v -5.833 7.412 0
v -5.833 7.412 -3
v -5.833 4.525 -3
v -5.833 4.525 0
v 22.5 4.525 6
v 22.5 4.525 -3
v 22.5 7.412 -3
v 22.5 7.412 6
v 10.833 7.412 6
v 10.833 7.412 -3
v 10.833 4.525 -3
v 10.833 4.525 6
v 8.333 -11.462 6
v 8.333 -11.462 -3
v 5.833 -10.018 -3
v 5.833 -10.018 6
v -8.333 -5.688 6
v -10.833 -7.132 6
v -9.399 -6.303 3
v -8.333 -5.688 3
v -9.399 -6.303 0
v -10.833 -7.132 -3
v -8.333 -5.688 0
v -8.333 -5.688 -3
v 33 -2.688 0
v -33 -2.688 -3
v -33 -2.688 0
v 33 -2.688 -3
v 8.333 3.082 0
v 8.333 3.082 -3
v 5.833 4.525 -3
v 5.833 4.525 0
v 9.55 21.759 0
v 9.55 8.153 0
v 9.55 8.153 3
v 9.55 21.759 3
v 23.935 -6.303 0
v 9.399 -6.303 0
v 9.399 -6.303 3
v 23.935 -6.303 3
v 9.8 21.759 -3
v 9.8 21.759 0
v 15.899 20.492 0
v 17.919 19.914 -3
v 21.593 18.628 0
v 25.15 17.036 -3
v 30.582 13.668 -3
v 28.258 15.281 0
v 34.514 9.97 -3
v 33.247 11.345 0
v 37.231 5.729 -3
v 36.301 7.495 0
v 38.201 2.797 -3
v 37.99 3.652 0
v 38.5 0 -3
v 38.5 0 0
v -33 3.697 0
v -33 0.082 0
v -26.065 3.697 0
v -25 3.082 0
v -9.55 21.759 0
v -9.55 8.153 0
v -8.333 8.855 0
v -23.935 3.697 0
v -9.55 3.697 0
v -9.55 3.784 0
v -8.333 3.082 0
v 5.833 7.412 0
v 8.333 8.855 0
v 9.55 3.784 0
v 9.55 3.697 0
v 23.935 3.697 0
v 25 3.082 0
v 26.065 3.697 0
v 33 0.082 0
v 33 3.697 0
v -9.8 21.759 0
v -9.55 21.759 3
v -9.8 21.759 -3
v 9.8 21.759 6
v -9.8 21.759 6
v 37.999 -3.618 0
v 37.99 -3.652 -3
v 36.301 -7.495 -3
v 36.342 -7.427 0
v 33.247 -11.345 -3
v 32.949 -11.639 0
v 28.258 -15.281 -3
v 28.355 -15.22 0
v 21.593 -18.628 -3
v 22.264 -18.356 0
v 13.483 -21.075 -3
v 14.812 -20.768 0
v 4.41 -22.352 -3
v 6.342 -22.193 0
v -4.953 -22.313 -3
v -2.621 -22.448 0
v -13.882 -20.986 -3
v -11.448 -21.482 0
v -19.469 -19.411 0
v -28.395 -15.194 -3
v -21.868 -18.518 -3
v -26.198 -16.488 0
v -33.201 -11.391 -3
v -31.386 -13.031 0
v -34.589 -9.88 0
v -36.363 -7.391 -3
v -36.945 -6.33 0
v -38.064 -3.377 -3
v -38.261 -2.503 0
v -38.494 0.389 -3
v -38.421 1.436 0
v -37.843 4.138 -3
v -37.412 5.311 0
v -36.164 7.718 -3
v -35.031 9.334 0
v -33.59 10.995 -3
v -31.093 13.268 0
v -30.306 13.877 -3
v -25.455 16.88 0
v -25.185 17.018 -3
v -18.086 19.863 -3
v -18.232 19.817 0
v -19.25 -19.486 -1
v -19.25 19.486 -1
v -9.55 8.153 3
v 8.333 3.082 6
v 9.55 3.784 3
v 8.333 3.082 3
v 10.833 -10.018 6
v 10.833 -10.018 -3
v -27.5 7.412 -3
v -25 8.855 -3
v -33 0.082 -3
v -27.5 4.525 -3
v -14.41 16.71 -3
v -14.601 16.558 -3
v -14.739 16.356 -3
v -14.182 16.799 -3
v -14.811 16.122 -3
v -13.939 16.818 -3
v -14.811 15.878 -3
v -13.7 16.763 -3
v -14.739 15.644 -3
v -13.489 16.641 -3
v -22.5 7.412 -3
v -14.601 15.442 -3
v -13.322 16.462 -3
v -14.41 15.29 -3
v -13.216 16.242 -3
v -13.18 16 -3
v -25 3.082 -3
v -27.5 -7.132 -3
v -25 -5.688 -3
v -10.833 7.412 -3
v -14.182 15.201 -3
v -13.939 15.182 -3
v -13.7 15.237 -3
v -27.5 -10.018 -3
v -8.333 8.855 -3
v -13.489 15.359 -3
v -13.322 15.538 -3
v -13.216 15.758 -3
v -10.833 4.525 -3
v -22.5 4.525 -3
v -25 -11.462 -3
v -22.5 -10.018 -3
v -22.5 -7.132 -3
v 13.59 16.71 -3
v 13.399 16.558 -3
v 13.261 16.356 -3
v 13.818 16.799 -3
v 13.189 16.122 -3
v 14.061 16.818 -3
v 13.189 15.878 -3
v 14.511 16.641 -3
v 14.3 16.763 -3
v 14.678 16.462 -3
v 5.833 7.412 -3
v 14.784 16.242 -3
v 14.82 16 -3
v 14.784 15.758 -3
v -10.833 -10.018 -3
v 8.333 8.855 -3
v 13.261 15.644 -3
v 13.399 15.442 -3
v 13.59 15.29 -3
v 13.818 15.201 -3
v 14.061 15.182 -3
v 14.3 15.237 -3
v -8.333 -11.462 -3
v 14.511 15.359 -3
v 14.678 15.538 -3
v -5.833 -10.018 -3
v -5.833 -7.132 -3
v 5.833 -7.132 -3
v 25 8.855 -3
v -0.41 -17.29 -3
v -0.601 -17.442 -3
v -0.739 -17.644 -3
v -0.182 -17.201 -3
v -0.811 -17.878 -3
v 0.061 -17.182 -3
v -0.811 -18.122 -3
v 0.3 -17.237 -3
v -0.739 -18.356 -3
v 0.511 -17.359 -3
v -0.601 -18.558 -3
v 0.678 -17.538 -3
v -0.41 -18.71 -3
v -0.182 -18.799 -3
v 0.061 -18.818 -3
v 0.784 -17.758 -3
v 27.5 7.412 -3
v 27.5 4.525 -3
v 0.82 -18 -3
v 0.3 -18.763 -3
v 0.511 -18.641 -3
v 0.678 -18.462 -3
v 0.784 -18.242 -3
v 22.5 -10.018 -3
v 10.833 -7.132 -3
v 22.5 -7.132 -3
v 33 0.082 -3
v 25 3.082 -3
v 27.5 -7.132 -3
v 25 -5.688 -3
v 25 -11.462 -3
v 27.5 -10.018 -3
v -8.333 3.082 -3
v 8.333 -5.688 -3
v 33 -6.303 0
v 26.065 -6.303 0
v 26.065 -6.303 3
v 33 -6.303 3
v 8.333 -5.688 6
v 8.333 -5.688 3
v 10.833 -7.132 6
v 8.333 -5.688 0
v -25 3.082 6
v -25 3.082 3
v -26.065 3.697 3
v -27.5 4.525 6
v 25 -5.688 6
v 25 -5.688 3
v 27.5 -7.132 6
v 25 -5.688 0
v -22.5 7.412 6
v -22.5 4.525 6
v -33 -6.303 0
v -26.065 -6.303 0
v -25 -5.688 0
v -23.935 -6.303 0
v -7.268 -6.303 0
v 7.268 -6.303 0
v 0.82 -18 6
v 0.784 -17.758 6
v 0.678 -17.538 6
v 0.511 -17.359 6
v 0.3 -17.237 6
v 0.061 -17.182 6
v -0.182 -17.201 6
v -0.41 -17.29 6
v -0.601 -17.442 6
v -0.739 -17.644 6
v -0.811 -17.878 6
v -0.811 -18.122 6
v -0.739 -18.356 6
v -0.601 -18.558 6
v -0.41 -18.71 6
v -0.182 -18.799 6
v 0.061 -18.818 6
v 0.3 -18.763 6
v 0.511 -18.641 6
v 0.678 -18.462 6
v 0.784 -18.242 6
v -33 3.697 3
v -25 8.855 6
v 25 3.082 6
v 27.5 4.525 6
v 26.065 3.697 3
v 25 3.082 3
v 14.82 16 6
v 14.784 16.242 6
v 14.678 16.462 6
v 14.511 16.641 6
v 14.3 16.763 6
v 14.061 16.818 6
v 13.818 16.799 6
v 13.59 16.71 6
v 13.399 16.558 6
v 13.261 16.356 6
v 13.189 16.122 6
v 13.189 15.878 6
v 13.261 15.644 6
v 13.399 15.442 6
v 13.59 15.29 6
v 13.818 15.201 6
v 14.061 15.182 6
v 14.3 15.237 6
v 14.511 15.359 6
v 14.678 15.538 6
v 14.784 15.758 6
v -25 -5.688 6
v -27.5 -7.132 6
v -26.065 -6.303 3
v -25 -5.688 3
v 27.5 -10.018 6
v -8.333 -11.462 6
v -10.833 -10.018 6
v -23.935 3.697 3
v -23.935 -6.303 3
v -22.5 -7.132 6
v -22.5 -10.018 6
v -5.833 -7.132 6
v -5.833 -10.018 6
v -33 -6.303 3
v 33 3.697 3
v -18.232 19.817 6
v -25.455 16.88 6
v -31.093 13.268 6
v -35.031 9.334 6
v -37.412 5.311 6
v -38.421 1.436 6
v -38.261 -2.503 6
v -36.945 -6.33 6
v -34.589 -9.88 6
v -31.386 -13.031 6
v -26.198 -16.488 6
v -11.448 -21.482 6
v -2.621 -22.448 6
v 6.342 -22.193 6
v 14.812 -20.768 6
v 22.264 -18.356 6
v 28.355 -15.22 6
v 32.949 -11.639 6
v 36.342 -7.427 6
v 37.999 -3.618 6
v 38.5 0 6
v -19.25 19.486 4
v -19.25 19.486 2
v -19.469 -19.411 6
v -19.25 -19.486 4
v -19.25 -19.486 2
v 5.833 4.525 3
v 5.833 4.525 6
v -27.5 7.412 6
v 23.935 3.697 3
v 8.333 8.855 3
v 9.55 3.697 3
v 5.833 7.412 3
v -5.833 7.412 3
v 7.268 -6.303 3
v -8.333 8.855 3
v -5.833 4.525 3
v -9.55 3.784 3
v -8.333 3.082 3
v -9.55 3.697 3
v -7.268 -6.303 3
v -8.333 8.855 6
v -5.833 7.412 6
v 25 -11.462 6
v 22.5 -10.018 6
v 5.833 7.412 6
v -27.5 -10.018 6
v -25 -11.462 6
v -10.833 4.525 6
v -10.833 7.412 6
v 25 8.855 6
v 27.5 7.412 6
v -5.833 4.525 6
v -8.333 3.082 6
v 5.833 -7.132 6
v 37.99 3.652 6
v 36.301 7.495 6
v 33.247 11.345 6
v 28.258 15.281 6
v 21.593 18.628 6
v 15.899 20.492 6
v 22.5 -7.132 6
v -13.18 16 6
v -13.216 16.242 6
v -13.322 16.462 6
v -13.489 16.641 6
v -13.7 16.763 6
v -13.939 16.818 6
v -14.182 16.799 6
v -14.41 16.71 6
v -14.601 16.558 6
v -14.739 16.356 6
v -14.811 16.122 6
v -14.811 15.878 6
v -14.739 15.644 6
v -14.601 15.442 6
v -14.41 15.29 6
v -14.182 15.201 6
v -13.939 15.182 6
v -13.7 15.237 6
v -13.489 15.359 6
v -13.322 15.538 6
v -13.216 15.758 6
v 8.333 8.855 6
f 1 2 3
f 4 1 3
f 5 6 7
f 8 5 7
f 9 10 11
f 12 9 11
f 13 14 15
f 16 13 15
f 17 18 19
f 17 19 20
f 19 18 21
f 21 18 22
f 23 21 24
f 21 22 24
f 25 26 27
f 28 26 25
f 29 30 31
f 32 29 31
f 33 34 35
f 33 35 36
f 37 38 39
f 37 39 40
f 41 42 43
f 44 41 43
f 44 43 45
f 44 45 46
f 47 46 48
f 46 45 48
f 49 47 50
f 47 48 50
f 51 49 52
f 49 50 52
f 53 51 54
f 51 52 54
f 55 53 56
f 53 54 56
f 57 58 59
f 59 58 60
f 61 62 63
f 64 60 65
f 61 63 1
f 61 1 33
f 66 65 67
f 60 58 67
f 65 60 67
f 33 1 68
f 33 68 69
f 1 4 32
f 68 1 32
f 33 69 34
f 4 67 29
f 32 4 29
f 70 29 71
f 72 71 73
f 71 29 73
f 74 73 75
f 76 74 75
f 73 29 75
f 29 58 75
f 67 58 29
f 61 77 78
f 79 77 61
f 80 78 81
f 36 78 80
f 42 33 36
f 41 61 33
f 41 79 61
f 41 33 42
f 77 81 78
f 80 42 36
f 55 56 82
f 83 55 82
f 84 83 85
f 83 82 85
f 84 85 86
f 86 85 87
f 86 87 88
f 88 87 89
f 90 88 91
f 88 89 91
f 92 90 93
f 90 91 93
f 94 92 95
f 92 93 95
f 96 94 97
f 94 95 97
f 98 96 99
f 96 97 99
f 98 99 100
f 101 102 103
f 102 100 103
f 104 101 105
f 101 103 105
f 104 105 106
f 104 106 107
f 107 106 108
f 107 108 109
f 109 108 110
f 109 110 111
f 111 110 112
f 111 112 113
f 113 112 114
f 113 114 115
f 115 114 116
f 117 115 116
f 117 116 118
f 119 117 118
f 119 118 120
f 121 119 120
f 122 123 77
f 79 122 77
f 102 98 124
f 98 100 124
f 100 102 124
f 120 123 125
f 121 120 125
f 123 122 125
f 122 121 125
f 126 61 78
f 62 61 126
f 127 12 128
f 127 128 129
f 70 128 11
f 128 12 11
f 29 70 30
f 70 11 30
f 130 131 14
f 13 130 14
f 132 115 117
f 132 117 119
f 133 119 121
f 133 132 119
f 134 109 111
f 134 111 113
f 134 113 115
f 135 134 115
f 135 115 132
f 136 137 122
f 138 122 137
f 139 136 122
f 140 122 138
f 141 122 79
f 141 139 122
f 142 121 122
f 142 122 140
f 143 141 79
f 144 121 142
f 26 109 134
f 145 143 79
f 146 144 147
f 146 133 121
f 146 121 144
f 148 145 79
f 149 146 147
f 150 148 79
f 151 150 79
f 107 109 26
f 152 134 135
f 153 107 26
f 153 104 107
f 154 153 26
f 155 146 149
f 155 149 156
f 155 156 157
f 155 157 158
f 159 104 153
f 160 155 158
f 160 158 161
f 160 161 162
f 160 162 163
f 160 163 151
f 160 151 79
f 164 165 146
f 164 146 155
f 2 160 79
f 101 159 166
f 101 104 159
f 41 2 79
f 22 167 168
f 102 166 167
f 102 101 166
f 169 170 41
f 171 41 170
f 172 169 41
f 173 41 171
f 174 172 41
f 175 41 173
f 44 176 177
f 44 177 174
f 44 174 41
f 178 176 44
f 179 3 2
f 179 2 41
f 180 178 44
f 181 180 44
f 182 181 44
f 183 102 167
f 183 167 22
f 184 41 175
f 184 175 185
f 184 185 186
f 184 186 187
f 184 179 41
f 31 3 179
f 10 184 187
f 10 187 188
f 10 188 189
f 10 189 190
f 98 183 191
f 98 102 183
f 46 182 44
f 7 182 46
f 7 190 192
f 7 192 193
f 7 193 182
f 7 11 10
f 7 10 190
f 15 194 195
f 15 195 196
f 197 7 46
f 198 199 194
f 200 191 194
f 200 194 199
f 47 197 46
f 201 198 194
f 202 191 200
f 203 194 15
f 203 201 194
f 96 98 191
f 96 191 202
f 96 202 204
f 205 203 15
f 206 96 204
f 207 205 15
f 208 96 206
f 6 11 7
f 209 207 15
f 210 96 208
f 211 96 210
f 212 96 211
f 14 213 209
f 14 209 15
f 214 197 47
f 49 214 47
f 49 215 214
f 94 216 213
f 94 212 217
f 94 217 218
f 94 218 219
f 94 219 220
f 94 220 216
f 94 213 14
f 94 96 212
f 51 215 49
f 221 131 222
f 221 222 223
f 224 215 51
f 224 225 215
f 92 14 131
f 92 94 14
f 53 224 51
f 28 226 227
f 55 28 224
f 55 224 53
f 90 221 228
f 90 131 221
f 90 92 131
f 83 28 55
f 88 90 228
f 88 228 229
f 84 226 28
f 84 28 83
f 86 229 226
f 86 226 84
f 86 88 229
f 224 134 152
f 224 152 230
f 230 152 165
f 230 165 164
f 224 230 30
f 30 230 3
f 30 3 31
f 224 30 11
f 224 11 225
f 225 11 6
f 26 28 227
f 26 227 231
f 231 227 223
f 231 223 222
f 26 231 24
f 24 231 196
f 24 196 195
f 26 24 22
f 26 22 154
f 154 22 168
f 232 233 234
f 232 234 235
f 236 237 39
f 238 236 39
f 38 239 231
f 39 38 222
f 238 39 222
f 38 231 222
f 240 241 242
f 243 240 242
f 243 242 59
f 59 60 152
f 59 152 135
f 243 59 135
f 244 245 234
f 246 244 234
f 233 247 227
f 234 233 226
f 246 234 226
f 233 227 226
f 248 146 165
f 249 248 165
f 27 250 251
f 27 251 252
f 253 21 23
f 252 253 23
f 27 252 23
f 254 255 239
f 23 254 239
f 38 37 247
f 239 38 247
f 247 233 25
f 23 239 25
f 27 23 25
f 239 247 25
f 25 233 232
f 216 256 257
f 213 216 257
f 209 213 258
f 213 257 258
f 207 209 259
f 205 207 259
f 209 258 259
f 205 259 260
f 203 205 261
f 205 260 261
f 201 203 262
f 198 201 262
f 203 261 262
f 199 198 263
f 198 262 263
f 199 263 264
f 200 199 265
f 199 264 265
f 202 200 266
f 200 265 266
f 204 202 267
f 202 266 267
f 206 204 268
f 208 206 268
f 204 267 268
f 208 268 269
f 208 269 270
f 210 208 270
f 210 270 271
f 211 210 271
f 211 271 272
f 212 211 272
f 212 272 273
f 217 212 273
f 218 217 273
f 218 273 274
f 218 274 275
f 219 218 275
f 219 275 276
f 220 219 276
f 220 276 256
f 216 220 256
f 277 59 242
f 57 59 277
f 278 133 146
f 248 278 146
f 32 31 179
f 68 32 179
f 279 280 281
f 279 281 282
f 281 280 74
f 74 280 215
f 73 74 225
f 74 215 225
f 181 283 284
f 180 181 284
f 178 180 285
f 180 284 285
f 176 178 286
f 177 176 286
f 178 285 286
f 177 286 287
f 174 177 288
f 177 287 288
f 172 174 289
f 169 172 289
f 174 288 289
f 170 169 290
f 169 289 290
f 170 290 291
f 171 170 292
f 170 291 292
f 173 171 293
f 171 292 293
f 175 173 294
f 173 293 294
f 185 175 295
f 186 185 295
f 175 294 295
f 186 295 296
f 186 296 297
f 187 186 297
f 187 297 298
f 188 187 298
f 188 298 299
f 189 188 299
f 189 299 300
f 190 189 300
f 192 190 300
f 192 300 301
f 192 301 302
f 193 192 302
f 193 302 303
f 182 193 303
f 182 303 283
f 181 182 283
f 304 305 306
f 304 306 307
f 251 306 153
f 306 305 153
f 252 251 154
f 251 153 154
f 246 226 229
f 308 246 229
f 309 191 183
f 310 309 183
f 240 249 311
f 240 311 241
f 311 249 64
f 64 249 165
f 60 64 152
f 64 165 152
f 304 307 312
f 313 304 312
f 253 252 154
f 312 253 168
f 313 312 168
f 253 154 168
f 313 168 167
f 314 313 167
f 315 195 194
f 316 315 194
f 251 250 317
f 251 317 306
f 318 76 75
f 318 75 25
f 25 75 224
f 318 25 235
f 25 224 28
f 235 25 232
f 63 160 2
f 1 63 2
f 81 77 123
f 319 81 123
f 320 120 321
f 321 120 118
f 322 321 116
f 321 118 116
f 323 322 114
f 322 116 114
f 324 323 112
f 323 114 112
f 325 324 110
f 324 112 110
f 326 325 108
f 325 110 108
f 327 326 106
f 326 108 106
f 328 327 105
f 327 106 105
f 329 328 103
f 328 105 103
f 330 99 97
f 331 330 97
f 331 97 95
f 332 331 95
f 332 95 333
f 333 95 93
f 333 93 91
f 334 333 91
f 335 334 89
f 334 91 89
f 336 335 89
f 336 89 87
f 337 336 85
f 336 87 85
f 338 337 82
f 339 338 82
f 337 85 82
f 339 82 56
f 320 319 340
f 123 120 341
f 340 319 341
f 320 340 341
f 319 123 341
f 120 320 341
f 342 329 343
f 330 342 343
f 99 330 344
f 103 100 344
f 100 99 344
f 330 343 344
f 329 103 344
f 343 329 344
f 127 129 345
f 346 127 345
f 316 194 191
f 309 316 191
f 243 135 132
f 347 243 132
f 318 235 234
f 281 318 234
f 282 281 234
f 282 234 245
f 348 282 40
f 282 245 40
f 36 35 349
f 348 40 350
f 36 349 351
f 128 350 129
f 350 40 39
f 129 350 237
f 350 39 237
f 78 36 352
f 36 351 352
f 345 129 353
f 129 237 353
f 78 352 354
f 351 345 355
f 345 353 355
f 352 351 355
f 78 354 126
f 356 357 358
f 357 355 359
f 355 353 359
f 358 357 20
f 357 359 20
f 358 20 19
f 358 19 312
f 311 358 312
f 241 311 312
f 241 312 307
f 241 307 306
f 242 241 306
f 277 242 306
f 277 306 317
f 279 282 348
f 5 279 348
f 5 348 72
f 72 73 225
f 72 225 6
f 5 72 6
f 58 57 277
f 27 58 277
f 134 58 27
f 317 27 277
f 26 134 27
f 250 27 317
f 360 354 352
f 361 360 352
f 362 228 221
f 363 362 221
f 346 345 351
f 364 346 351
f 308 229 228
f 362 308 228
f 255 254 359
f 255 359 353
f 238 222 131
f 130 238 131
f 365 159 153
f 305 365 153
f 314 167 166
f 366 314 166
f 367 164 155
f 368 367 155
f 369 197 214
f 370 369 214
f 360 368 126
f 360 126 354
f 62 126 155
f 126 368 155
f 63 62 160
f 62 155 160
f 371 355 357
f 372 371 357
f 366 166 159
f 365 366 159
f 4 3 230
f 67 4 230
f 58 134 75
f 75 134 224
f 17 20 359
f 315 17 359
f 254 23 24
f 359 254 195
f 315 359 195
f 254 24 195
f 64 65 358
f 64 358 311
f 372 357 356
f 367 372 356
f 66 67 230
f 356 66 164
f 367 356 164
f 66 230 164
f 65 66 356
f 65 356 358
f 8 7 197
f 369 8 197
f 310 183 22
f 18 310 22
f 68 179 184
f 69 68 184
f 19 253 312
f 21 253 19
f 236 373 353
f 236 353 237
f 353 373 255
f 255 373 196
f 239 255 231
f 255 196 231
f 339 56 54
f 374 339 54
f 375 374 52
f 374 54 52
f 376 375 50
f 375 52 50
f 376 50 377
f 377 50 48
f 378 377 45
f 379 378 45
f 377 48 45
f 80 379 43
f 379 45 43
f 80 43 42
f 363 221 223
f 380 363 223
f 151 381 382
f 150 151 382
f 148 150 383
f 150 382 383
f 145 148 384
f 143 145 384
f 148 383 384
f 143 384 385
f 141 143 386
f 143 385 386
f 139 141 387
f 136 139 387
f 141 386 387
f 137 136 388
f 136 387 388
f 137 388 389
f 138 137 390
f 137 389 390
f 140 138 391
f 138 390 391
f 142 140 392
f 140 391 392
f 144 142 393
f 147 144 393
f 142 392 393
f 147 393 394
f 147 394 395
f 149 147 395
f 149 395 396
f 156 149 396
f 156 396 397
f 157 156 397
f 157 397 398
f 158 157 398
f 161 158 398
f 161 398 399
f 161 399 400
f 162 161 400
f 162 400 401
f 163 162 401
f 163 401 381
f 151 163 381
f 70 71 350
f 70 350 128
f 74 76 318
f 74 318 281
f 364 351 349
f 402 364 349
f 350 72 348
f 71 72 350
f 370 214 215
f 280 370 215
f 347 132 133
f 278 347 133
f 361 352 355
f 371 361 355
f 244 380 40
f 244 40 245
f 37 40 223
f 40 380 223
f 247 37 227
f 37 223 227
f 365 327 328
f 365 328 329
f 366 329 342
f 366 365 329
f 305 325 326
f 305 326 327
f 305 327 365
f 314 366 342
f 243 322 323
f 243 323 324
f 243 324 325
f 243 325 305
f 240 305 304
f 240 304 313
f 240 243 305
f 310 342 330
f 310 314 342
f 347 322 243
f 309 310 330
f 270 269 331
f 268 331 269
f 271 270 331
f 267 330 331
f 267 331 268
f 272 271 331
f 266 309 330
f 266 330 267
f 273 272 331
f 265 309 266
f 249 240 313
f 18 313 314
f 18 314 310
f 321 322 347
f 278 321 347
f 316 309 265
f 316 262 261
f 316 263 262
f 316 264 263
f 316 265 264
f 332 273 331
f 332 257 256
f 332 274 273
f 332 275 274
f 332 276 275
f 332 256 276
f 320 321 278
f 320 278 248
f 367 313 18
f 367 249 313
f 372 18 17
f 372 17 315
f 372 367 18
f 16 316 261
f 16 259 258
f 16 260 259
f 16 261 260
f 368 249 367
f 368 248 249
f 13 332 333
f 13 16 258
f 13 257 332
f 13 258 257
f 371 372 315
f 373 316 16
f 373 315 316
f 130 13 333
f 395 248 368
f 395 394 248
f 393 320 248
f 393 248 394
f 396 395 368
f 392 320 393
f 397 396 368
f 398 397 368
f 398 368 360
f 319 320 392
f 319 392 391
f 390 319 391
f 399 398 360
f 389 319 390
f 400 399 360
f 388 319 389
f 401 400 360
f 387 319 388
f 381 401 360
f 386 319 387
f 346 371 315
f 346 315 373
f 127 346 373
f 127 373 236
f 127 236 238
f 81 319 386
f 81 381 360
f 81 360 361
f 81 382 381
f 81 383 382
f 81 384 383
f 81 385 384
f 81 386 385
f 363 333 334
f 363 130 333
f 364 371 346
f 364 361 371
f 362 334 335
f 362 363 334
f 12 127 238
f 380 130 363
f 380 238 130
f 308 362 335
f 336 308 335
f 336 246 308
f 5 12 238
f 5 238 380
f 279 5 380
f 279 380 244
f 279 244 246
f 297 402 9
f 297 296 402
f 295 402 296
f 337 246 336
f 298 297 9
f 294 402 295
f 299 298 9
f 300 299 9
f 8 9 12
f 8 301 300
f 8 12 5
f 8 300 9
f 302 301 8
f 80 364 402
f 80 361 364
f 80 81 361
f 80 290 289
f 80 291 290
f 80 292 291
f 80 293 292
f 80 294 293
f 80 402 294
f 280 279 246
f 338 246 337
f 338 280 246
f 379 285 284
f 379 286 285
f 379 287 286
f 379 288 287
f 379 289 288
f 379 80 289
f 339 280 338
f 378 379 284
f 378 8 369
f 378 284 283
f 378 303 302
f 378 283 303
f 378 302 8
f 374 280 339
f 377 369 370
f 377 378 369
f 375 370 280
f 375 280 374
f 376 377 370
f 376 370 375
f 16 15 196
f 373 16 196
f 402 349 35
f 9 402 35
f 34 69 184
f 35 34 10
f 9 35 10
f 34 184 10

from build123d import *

# Parameters (mm, degrees)
PAD_DEPTH           = 6
POCKET_DEPTH        = 3
PAD001_DEPTH        = 3
SKETCH003_W         = 66
SKETCH003_H         = 2.77
POCKET001_DEPTH     = 3
SKETCH004_W         = 19.6
SKETCH004_H         = 1
POCKET002_DEPTH     = 9.001
SKETCH005_R         = 0.82
POCKET003_DEPTH     = 9.001
POCKET004_DEPTH     = 9.001
LINEARPATTERN_COUNT = 4
LINEARPATTERN_PITCH = 16.666667


with BuildPart() as part:
    # Sketch → Pad (new body)
    with BuildSketch(Plane.XY):
        with BuildLine():
            add(Edge.make_bspline(
                [(38.5, 0), (38.5, 38.971143), (-19.25, 19.485572), (-77, 0), (-19.25, -19.485572), (38.5, -38.971143), (38.5, 0)],
                knots=[0, 0, 0, 2.094395, 2.094395, 4.18879, 4.18879, 6.283185, 6.283185, 6.283185], degree=2, weights=[1, 0.5, 1, 0.5, 1, 0.5, 1]))
        make_face()
    extrude(amount=PAD_DEPTH)

    # Sketch001 (on Face2 of Pad) → Pocket (cut)
    with BuildSketch(Plane(origin=(0, 0, 0), x_dir=(1, 0, 0), z_dir=(0, 0, -1))):
        Polygon((9.55, -3.696801), (9.55, -21.796801), (-9.55, -21.796801), (-9.55, -3.696801), (-33, -3.696801), (-33, 6.303199), (33, 6.303199), (33, -3.696801), align=None)
    extrude(amount=-POCKET_DEPTH, mode=Mode.SUBTRACT)

    # Sketch002 (on Face2 of Pocket) → Pad001 (join)
    with BuildSketch(Plane(origin=(0, 0, 0), x_dir=(1, 0, 0), z_dir=(0, 0, -1))):
        with BuildLine():
            add(Edge.make_bspline(
                [(38.5, 0), (38.5, 38.971143), (-19.25, 19.485572), (-77, 0), (-19.25, -19.485572), (38.5, -38.971143), (38.5, 0)],
                knots=[0, 0, 0, 2.094395, 2.094395, 4.18879, 4.18879, 6.283185, 6.283185, 6.283185], degree=2, weights=[1, 0.5, 1, 0.5, 1, 0.5, 1]))
        make_face()
    extrude(amount=PAD001_DEPTH)

    # Sketch003 (on Face4 of Pad001) → Pocket001 (cut)
    with BuildSketch(Plane(origin=(0, 0, -3), x_dir=(1, 0, 0), z_dir=(0, 0, -1))):
        with Locations((0, 1.303199)):
            Rectangle(SKETCH003_W, SKETCH003_H)
    extrude(amount=-POCKET001_DEPTH, mode=Mode.SUBTRACT)

    # Sketch004 (on Face4 of Pocket001) → Pocket002 (cut, through all)
    with BuildSketch(Plane(origin=(0, 0, -3), x_dir=(1, 0, 0), z_dir=(0, 0, -1))):
        with Locations((0, -22.258868)):
            Rectangle(SKETCH004_W, SKETCH004_H)
    extrude(amount=-POCKET002_DEPTH, mode=Mode.SUBTRACT)

    # Sketch005 (on Face4 of Pocket002) → Pocket003 (cut, through all)
    with BuildSketch(Plane.XY.offset(6)):
        with Locations((-14, 16)):
            Circle(SKETCH005_R)
        with Locations((14, 16)):
            Circle(SKETCH005_R)
        with Locations((0, -18)):
            Circle(SKETCH005_R)
    extrude(amount=-POCKET003_DEPTH, mode=Mode.SUBTRACT)

    # Sketch006 (on Face7 of Pocket003) → Pocket004 (cut, through all)
    with BuildSketch(Plane(origin=(0, 0, -3), x_dir=(1, 0, 0), z_dir=(0, 0, -1))):
        Polygon((-22.5, -7.411928), (-22.5, -4.525177), (-25, -3.081801), (-27.5, -4.525177), (-27.5, -7.411928), (-25, -8.855304), align=None)
        Polygon((-22.5, 7.131574), (-22.5, 10.018326), (-25, 11.461701), (-27.5, 10.018326), (-27.5, 7.131574), (-25, 5.688199), align=None)
    pocket004 = extrude(amount=-POCKET004_DEPTH, mode=Mode.SUBTRACT)

    # LinearPattern: Pocket004 ×4
    with Locations(*[(i * LINEARPATTERN_PITCH, 0, 0) for i in range(1, LINEARPATTERN_COUNT)]):
        add(pocket004, mode=Mode.SUBTRACT)


solid = part.part
